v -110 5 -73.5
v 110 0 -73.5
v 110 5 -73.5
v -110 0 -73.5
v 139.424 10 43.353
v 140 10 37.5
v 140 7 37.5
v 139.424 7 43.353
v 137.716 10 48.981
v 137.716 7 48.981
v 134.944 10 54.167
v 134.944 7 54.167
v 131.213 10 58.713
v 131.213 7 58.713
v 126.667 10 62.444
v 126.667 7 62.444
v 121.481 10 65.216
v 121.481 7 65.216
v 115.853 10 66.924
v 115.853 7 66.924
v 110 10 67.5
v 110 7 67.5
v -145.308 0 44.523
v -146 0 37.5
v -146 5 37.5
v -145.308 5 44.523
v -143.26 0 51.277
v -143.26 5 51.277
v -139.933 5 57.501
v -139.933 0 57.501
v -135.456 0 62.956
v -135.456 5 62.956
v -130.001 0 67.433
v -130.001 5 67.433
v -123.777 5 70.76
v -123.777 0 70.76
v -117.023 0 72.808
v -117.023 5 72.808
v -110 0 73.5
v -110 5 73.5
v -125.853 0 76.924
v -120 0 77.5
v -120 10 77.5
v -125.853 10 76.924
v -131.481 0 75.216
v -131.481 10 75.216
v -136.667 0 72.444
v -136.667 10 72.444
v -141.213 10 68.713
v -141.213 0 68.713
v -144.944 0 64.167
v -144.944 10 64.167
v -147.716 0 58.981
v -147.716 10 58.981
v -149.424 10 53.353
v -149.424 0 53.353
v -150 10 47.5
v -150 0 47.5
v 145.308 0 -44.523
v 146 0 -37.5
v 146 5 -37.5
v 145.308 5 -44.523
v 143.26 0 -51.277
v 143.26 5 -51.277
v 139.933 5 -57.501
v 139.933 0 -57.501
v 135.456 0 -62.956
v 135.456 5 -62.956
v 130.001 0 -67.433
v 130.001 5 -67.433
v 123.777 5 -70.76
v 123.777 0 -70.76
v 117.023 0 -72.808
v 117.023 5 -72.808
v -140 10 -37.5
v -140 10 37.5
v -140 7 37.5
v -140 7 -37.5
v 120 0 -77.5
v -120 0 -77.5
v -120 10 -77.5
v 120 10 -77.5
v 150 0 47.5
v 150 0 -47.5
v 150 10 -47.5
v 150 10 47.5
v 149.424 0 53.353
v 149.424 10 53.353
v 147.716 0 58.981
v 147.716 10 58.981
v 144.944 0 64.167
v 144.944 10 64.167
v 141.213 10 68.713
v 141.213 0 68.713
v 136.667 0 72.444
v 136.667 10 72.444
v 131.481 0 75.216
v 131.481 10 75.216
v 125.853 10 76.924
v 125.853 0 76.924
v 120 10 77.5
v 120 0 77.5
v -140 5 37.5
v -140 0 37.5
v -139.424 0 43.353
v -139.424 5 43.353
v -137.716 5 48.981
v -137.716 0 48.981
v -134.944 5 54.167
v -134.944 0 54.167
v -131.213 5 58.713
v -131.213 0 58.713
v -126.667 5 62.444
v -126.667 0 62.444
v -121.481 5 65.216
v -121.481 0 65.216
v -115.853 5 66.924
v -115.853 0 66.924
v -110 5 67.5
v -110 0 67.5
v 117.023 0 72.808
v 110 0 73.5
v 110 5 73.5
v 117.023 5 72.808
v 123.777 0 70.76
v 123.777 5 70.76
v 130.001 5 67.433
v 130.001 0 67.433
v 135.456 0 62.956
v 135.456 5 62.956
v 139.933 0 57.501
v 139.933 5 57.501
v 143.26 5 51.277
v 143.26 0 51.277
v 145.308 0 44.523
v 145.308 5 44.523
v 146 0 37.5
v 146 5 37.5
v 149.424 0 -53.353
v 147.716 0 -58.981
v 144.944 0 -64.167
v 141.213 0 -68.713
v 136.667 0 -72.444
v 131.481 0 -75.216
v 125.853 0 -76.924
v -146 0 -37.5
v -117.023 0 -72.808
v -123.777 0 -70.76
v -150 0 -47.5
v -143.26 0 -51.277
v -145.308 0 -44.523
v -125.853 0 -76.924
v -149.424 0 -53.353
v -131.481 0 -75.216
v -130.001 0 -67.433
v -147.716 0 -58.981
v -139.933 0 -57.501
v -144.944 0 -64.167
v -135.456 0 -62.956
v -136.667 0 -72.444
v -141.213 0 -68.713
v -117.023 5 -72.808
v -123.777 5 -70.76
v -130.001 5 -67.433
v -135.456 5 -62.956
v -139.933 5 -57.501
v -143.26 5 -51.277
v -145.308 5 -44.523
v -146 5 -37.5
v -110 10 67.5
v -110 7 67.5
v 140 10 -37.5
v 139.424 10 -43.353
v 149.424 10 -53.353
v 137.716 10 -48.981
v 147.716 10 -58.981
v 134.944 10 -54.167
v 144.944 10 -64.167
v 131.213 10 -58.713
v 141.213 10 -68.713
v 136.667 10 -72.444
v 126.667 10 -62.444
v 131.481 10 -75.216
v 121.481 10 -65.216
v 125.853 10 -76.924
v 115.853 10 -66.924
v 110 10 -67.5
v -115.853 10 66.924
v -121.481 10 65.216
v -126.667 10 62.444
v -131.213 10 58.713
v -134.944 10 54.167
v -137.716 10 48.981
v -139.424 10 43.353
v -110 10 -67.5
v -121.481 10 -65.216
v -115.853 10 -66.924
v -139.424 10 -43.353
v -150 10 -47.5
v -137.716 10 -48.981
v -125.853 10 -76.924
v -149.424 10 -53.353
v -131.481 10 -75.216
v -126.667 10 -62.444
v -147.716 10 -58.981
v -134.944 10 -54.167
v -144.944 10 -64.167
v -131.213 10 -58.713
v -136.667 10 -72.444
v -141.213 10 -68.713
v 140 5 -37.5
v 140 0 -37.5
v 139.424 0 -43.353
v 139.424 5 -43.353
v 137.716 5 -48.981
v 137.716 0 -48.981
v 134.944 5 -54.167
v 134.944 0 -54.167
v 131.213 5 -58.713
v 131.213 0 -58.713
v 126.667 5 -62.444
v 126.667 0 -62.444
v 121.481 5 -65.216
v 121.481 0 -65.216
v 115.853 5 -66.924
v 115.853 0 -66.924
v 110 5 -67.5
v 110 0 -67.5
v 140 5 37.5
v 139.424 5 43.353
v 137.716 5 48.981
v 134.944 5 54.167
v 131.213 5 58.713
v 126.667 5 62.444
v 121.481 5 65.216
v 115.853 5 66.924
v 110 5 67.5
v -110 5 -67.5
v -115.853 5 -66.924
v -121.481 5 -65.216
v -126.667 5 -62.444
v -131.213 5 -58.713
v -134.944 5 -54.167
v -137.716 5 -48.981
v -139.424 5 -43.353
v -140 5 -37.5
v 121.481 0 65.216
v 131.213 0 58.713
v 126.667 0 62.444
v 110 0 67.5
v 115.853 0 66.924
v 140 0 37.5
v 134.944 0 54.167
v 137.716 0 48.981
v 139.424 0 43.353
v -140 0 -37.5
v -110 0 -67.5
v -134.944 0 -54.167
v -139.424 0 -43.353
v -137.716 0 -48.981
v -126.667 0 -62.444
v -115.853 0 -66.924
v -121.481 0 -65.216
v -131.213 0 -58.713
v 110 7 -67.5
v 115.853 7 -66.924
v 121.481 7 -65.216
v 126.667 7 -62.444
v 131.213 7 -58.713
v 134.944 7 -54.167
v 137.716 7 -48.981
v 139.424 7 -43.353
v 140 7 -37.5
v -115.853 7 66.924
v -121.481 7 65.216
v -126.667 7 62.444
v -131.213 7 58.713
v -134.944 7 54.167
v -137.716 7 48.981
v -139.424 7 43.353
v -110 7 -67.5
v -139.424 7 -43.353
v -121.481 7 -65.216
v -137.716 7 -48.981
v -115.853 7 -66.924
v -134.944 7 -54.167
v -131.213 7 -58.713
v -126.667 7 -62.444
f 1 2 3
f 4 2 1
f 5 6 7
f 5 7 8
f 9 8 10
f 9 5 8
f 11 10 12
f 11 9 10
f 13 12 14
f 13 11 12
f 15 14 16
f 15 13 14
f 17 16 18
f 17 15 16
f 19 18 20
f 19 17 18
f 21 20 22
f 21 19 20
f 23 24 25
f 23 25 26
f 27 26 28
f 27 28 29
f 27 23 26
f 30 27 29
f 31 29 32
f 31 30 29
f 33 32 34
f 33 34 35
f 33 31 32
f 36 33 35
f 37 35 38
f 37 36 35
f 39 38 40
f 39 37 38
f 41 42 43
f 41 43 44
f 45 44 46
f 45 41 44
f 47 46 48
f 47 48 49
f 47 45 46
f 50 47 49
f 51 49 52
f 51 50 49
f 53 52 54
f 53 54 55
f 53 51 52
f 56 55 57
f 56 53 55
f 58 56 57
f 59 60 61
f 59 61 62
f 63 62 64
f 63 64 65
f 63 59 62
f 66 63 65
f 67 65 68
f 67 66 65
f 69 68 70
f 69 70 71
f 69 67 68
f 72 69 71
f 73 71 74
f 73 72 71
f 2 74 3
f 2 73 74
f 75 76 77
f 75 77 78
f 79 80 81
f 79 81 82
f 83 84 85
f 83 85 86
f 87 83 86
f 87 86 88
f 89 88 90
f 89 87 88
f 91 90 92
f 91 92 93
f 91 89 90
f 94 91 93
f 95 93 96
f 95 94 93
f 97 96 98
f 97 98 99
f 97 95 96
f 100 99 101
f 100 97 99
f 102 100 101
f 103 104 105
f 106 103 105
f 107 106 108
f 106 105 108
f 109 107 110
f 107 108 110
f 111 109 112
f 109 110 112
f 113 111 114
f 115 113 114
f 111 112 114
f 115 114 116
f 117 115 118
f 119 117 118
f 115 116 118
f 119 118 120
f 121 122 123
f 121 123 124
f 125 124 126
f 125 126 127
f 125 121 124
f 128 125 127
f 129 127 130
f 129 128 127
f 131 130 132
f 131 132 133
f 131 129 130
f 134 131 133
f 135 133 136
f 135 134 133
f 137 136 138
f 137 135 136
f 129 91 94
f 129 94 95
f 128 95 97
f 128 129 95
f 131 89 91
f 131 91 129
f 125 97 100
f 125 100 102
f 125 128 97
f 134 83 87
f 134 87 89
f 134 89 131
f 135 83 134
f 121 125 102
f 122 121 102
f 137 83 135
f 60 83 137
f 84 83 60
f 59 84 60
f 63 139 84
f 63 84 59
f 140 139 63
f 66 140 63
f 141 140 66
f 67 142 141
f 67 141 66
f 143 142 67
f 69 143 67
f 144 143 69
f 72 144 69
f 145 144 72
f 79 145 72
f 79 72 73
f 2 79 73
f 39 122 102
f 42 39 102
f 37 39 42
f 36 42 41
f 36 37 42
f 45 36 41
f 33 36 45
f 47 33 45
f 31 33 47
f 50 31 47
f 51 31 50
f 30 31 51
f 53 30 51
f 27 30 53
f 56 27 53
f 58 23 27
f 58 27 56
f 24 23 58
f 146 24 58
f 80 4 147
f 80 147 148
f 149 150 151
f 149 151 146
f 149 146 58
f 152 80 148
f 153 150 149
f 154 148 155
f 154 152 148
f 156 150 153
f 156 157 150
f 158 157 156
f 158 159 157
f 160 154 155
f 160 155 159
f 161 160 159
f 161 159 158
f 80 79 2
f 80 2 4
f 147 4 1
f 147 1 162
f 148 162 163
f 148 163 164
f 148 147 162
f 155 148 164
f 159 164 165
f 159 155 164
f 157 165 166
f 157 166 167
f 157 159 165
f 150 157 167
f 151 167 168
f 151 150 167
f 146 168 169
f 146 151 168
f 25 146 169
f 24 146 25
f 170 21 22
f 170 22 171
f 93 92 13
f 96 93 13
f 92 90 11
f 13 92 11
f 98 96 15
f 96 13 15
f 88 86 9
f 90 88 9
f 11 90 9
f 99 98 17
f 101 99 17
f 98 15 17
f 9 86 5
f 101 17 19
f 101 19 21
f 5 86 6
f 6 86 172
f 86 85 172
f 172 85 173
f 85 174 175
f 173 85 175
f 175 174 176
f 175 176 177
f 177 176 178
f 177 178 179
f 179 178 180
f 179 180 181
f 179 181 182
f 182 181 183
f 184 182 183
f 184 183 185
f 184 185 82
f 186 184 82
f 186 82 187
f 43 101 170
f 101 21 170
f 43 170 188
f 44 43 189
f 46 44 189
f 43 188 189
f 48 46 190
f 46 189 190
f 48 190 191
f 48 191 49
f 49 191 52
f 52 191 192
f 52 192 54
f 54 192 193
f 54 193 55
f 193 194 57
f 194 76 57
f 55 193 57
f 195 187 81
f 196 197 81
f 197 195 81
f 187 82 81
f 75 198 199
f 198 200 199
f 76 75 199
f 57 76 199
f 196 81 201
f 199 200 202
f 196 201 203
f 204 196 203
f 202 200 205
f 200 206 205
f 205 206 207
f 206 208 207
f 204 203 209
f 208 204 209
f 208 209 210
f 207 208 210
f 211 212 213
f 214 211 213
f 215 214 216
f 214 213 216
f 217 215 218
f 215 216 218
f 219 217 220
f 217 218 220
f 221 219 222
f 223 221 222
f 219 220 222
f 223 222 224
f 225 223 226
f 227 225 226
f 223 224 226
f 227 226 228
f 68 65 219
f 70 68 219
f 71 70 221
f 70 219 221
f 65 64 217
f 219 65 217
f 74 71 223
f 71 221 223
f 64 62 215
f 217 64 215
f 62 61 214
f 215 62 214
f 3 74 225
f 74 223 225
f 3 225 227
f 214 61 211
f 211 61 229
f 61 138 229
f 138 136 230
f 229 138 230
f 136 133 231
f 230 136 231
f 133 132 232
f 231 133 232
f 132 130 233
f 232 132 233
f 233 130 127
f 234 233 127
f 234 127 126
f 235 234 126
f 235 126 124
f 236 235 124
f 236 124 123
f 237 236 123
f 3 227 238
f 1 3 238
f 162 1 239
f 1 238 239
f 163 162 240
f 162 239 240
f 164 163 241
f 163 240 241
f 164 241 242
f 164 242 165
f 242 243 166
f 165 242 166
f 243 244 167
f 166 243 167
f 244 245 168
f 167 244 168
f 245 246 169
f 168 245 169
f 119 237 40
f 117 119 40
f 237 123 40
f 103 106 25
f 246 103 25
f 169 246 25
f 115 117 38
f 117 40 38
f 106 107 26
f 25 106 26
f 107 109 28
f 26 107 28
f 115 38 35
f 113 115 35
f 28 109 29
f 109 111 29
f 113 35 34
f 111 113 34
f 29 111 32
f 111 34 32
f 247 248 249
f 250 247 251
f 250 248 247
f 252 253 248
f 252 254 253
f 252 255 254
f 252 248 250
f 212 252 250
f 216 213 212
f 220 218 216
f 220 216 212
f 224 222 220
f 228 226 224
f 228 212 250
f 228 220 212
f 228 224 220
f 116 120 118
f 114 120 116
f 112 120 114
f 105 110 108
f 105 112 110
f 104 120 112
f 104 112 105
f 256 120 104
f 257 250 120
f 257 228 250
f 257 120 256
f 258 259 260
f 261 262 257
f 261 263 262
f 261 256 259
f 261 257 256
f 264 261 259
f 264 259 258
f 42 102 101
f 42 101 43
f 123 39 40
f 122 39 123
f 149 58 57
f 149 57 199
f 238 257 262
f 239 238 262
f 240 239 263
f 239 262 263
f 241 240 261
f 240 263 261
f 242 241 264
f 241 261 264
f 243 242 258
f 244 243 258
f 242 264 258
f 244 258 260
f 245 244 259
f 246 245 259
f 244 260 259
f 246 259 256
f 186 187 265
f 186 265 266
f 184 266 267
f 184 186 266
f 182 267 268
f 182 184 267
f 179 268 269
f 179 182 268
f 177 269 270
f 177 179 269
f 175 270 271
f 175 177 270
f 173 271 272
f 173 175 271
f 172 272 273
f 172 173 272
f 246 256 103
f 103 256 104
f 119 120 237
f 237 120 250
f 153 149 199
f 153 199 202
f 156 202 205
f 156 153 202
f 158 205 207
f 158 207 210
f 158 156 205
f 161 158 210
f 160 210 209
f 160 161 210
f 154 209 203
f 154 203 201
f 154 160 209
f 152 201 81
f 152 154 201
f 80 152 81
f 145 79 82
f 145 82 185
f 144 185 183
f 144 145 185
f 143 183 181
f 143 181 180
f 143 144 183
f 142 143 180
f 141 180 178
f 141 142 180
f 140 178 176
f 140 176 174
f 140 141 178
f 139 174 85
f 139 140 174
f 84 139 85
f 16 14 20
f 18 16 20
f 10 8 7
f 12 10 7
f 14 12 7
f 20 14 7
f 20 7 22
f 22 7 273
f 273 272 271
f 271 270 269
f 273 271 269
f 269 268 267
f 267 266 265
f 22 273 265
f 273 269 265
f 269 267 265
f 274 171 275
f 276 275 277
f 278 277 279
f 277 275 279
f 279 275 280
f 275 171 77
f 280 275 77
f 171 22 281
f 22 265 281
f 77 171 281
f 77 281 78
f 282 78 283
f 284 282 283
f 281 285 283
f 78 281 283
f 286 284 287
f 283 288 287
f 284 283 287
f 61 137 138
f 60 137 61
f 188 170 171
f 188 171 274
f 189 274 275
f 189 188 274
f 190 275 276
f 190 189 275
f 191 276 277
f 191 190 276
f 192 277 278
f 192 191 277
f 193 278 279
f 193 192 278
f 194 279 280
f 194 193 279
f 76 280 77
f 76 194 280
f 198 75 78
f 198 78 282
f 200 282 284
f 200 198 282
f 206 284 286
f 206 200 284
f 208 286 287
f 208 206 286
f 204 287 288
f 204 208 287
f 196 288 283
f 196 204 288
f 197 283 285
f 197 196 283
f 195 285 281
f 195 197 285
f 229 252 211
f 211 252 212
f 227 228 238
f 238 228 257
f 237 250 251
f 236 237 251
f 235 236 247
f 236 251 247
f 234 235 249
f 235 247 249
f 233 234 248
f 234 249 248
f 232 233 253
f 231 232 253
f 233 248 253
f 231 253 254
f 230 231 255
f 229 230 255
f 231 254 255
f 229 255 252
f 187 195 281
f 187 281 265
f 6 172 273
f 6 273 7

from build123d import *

# Parameters (mm, degrees)
BOSS_EXTRUDE1_DEPTH = 10
CUT_EXTRUDE1_DEPTH  = 5
CUT_EXTRUDE2_DEPTH  = 3


with BuildPart() as part:
    # Sketch1 → Boss-Extrude1 (new body)
    with BuildSketch(Plane(origin=(0, 0, 0), x_dir=(1, 0, 0), z_dir=(0, 1, 0))):
        with BuildLine():
            Line((-120, 77.5), (120, 77.5))
            ThreePointArc((120, 77.5), (141.213203436, 68.713203436), (150, 47.5))
            Line((150, 47.5), (150, -47.5))
            ThreePointArc((150, -47.5), (141.213203436, -68.713203436), (120, -77.5))
            Line((120, -77.5), (-120, -77.5))
            ThreePointArc((-120, -77.5), (-141.213203436, -68.713203436), (-150, -47.5))
            Line((-150, -47.5), (-150, 47.5))
            ThreePointArc((-150, 47.5), (-141.213203436, 68.713203436), (-120, 77.5))
        make_face()
    extrude(amount=BOSS_EXTRUDE1_DEPTH)

    # Sketch2 → Cut-Extrude1 (cut)
    with BuildSketch(Plane.XZ):
        with BuildLine():
            Line((-110, 73.5), (110, 73.5))
            ThreePointArc((110, 73.5), (135.455844123, 62.955844123), (146, 37.5))
            Line((146, 37.5), (146, -37.5))
            ThreePointArc((146, -37.5), (135.455844123, -62.955844123), (110, -73.5))
            Line((110, -73.5), (-110, -73.5))
            ThreePointArc((-110, -73.5), (-135.455844123, -62.955844123), (-146, -37.5))
            Line((-146, -37.5), (-146, 37.5))
            ThreePointArc((-146, 37.5), (-135.455844123, 62.955844123), (-110, 73.5))
        make_face()
        with BuildLine():
            Line((-110, 67.5), (110, 67.5))
            ThreePointArc((110, 67.5), (131.213203436, 58.713203436), (140, 37.5))
            Line((140, 37.5), (140, -37.5))
            ThreePointArc((140, -37.5), (131.213203436, -58.713203436), (110, -67.5))
            Line((110, -67.5), (-110, -67.5))
            ThreePointArc((-110, -67.5), (-131.213203436, -58.713203436), (-140, -37.5))
            Line((-140, -37.5), (-140, 37.5))
            ThreePointArc((-140, 37.5), (-131.213203436, 58.713203436), (-110, 67.5))
        make_face(mode=Mode.SUBTRACT)
    extrude(amount=-CUT_EXTRUDE1_DEPTH, mode=Mode.SUBTRACT)

    # Sketch3 → Cut-Extrude2 (cut)
    with BuildSketch(Plane(origin=(0, 10, 0), x_dir=(1, 0, 0), z_dir=(0, 1, 0))):
        with BuildLine():
            Line((-110, 67.5), (110, 67.5))
            ThreePointArc((110, 67.5), (131.213203436, 58.713203436), (140, 37.5))
            Line((140, 37.5), (140, -37.5))
            ThreePointArc((140, -37.5), (131.213203436, -58.713203436), (110, -67.5))
            Line((110, -67.5), (-110, -67.5))
            ThreePointArc((-110, -67.5), (-131.213203436, -58.713203436), (-140, -37.5))
            Line((-140, -37.5), (-140, 37.5))
            ThreePointArc((-140, 37.5), (-131.213203436, 58.713203436), (-110, 67.5))
        make_face()
    extrude(amount=-CUT_EXTRUDE2_DEPTH, mode=Mode.SUBTRACT)


solid = part.part
